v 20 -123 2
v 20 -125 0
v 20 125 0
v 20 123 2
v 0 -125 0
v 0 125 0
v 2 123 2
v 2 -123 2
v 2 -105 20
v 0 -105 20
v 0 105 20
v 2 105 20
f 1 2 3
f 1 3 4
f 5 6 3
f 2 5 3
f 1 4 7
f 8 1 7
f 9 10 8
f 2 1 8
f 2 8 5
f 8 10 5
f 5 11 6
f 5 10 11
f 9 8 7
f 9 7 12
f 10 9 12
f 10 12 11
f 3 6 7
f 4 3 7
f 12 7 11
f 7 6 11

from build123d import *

# Parameters (mm, degrees)
F1_DEPTH = 125
F3_DEPTH = 20.001


with BuildPart() as f1:
    # F0 (on Front) → F1 (new body, symmetric)
    with BuildSketch(Plane.XZ):
        Polygon((0, 20), (0, 0), (20, 0), (20, 2), (2, 2), (2, 20), align=None)
    extrude(amount=F1_DEPTH, both=True)

    # F2 (on face) → F3 (cut, through all)
    with BuildSketch(Plane(origin=(0, 0, 0), x_dir=(0, -1, 0), z_dir=(-1, 0, 0))):
        Polygon((-125, 20), (-125, 0), (-105, 20), align=None)
        Polygon((125, 0), (125, 20), (105, 20), align=None)
    extrude(amount=-F3_DEPTH, mode=Mode.SUBTRACT)


with BuildPart() as f4_1:
    # F4: copy of F1
    add(f1.part)


solid = f4_1.part
